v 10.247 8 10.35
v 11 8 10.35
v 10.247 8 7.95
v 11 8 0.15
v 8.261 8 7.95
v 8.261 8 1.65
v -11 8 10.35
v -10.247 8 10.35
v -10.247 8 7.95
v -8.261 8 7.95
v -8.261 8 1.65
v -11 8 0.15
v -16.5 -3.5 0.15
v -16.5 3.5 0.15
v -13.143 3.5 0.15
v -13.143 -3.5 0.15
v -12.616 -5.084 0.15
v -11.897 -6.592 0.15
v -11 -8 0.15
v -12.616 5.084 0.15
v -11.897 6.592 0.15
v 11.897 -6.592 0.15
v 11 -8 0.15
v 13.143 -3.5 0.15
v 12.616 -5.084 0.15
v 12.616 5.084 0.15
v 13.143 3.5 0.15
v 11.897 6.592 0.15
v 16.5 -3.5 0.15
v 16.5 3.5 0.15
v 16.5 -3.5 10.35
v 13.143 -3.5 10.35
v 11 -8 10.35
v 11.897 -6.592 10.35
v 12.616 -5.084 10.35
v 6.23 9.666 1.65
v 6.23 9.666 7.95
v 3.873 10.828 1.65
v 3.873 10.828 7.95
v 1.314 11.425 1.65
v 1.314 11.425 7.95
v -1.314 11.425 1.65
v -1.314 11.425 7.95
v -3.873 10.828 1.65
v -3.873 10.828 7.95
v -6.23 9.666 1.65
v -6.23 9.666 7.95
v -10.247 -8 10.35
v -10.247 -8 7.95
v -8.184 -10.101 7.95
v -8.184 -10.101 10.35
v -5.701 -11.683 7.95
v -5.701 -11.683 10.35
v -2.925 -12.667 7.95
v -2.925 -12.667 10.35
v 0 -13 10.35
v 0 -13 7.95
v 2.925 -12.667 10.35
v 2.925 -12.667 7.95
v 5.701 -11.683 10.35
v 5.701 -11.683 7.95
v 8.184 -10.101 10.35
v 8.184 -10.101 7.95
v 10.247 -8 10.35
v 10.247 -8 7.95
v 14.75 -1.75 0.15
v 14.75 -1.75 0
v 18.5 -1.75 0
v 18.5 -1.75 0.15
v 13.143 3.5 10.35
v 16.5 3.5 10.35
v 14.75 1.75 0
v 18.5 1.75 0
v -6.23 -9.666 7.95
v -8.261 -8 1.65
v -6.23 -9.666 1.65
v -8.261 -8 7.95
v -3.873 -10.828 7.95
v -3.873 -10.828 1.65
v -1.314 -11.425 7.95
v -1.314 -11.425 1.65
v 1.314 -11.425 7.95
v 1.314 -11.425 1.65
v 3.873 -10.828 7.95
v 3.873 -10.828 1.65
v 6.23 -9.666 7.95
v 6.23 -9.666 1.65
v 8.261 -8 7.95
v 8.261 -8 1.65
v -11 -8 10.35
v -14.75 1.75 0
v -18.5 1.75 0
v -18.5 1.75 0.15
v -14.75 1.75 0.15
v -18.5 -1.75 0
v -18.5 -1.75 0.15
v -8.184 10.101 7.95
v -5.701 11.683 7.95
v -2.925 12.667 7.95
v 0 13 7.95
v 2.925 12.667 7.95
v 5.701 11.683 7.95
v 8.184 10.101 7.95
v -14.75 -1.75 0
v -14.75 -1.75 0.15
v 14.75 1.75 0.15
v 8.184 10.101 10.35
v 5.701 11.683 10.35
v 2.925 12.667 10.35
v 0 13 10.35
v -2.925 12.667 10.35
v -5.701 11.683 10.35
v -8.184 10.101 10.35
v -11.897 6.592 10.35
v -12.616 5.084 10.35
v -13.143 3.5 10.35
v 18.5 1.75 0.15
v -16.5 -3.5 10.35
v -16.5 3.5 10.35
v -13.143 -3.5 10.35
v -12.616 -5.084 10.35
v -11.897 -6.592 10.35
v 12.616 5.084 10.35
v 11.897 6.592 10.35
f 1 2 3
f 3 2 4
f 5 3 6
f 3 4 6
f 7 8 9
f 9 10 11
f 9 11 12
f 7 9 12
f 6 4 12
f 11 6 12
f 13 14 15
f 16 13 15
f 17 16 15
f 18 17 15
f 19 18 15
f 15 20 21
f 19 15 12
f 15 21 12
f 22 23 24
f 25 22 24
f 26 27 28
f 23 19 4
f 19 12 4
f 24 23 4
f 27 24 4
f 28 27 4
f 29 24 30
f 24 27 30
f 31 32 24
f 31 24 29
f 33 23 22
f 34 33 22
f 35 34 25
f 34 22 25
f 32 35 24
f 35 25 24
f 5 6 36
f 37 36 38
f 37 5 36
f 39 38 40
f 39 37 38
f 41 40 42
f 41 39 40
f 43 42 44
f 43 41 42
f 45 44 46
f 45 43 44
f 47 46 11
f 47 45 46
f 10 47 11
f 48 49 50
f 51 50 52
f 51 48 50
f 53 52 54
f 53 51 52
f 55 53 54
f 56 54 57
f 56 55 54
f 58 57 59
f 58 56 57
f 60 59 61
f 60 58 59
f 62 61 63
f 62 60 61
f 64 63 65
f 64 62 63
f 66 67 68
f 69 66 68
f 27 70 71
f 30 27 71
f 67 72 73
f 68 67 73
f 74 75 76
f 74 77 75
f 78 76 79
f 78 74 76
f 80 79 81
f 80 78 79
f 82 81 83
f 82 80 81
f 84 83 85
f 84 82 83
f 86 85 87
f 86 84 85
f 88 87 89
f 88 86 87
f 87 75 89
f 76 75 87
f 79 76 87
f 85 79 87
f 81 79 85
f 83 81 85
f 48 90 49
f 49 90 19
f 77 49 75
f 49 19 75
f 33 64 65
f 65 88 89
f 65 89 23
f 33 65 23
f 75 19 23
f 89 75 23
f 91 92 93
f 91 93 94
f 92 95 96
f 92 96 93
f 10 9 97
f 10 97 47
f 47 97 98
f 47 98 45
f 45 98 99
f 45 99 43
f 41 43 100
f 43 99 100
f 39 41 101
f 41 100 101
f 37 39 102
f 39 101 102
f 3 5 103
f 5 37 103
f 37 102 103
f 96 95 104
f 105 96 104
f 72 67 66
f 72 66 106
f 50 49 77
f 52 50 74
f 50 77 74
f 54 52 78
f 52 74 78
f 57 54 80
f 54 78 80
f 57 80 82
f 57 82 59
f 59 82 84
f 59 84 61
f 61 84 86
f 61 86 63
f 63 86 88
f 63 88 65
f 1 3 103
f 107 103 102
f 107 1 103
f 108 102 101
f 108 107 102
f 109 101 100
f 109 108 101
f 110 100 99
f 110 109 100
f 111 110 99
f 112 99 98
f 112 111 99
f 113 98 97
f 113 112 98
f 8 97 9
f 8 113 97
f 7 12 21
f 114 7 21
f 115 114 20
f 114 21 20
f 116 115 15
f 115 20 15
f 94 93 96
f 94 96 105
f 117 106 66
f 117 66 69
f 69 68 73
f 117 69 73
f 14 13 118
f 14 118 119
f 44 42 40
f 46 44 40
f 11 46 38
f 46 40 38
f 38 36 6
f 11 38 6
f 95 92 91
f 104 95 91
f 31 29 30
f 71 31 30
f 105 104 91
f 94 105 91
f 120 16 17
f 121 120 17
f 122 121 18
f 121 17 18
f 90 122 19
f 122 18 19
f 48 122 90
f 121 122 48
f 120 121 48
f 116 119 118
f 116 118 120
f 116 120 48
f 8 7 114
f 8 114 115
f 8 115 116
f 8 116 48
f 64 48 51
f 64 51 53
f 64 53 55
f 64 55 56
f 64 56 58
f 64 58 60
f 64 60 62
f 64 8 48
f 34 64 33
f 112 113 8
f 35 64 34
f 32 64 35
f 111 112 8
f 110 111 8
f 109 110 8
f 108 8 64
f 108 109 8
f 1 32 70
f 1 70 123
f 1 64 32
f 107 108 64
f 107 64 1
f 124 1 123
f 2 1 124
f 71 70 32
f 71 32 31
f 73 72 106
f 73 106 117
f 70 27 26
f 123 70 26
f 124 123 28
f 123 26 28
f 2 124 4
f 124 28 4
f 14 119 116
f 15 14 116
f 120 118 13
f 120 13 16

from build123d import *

# Parameters (mm, degrees)
F0_W     = 3.75
F0_H     = 3.5
F1_DEPTH = 0.15
F2_W     = 33
F2_H     = 7
F3_DEPTH = 10.2
F5_DEPTH = 10.2
F6_R     = 11.5
F7_DEPTH = 8.7
F8_R     = 13
F9_DEPTH = 2.4


with BuildPart() as f1:
    # F0 (on Top) → F1 (new body)
    with BuildSketch(Plane.XY):
        with Locations((-16.625, 0)):
            Rectangle(F0_W, F0_H)
        with Locations((16.625, 0)):
            Rectangle(F0_W, F0_H)
    extrude(amount=F1_DEPTH)


with BuildPart() as f3:
    # F2 (on face) → F3 (new body)
    with BuildSketch(Plane.XY.offset(0.15)):
        Rectangle(F2_W, F2_H)
    extrude(amount=F3_DEPTH)

    # F4 (on face) → F5 (join)
    with BuildSketch(Plane.XY.offset(0.15)):
        with BuildLine():
            Line((11, 8), (-11, 8))
            ThreePointArc((-11, 8), (-13.601471, 0), (-11, -8))
            Line((-11, -8), (11, -8))
            ThreePointArc((11, -8), (13.601471, 0), (11, 8))
        make_face()
    extrude(amount=F5_DEPTH)

    # F6 (on face) → F7 (join)
    with BuildSketch(Plane.XY.offset(10.35)):
        Circle(F6_R)
    extrude(amount=-F7_DEPTH)

    # F8 (on face) → F9 (join)
    with BuildSketch(Plane.XY.offset(10.35)):
        Circle(F8_R)
    extrude(amount=-F9_DEPTH)


solid = Compound([f1.part, f3.part])
